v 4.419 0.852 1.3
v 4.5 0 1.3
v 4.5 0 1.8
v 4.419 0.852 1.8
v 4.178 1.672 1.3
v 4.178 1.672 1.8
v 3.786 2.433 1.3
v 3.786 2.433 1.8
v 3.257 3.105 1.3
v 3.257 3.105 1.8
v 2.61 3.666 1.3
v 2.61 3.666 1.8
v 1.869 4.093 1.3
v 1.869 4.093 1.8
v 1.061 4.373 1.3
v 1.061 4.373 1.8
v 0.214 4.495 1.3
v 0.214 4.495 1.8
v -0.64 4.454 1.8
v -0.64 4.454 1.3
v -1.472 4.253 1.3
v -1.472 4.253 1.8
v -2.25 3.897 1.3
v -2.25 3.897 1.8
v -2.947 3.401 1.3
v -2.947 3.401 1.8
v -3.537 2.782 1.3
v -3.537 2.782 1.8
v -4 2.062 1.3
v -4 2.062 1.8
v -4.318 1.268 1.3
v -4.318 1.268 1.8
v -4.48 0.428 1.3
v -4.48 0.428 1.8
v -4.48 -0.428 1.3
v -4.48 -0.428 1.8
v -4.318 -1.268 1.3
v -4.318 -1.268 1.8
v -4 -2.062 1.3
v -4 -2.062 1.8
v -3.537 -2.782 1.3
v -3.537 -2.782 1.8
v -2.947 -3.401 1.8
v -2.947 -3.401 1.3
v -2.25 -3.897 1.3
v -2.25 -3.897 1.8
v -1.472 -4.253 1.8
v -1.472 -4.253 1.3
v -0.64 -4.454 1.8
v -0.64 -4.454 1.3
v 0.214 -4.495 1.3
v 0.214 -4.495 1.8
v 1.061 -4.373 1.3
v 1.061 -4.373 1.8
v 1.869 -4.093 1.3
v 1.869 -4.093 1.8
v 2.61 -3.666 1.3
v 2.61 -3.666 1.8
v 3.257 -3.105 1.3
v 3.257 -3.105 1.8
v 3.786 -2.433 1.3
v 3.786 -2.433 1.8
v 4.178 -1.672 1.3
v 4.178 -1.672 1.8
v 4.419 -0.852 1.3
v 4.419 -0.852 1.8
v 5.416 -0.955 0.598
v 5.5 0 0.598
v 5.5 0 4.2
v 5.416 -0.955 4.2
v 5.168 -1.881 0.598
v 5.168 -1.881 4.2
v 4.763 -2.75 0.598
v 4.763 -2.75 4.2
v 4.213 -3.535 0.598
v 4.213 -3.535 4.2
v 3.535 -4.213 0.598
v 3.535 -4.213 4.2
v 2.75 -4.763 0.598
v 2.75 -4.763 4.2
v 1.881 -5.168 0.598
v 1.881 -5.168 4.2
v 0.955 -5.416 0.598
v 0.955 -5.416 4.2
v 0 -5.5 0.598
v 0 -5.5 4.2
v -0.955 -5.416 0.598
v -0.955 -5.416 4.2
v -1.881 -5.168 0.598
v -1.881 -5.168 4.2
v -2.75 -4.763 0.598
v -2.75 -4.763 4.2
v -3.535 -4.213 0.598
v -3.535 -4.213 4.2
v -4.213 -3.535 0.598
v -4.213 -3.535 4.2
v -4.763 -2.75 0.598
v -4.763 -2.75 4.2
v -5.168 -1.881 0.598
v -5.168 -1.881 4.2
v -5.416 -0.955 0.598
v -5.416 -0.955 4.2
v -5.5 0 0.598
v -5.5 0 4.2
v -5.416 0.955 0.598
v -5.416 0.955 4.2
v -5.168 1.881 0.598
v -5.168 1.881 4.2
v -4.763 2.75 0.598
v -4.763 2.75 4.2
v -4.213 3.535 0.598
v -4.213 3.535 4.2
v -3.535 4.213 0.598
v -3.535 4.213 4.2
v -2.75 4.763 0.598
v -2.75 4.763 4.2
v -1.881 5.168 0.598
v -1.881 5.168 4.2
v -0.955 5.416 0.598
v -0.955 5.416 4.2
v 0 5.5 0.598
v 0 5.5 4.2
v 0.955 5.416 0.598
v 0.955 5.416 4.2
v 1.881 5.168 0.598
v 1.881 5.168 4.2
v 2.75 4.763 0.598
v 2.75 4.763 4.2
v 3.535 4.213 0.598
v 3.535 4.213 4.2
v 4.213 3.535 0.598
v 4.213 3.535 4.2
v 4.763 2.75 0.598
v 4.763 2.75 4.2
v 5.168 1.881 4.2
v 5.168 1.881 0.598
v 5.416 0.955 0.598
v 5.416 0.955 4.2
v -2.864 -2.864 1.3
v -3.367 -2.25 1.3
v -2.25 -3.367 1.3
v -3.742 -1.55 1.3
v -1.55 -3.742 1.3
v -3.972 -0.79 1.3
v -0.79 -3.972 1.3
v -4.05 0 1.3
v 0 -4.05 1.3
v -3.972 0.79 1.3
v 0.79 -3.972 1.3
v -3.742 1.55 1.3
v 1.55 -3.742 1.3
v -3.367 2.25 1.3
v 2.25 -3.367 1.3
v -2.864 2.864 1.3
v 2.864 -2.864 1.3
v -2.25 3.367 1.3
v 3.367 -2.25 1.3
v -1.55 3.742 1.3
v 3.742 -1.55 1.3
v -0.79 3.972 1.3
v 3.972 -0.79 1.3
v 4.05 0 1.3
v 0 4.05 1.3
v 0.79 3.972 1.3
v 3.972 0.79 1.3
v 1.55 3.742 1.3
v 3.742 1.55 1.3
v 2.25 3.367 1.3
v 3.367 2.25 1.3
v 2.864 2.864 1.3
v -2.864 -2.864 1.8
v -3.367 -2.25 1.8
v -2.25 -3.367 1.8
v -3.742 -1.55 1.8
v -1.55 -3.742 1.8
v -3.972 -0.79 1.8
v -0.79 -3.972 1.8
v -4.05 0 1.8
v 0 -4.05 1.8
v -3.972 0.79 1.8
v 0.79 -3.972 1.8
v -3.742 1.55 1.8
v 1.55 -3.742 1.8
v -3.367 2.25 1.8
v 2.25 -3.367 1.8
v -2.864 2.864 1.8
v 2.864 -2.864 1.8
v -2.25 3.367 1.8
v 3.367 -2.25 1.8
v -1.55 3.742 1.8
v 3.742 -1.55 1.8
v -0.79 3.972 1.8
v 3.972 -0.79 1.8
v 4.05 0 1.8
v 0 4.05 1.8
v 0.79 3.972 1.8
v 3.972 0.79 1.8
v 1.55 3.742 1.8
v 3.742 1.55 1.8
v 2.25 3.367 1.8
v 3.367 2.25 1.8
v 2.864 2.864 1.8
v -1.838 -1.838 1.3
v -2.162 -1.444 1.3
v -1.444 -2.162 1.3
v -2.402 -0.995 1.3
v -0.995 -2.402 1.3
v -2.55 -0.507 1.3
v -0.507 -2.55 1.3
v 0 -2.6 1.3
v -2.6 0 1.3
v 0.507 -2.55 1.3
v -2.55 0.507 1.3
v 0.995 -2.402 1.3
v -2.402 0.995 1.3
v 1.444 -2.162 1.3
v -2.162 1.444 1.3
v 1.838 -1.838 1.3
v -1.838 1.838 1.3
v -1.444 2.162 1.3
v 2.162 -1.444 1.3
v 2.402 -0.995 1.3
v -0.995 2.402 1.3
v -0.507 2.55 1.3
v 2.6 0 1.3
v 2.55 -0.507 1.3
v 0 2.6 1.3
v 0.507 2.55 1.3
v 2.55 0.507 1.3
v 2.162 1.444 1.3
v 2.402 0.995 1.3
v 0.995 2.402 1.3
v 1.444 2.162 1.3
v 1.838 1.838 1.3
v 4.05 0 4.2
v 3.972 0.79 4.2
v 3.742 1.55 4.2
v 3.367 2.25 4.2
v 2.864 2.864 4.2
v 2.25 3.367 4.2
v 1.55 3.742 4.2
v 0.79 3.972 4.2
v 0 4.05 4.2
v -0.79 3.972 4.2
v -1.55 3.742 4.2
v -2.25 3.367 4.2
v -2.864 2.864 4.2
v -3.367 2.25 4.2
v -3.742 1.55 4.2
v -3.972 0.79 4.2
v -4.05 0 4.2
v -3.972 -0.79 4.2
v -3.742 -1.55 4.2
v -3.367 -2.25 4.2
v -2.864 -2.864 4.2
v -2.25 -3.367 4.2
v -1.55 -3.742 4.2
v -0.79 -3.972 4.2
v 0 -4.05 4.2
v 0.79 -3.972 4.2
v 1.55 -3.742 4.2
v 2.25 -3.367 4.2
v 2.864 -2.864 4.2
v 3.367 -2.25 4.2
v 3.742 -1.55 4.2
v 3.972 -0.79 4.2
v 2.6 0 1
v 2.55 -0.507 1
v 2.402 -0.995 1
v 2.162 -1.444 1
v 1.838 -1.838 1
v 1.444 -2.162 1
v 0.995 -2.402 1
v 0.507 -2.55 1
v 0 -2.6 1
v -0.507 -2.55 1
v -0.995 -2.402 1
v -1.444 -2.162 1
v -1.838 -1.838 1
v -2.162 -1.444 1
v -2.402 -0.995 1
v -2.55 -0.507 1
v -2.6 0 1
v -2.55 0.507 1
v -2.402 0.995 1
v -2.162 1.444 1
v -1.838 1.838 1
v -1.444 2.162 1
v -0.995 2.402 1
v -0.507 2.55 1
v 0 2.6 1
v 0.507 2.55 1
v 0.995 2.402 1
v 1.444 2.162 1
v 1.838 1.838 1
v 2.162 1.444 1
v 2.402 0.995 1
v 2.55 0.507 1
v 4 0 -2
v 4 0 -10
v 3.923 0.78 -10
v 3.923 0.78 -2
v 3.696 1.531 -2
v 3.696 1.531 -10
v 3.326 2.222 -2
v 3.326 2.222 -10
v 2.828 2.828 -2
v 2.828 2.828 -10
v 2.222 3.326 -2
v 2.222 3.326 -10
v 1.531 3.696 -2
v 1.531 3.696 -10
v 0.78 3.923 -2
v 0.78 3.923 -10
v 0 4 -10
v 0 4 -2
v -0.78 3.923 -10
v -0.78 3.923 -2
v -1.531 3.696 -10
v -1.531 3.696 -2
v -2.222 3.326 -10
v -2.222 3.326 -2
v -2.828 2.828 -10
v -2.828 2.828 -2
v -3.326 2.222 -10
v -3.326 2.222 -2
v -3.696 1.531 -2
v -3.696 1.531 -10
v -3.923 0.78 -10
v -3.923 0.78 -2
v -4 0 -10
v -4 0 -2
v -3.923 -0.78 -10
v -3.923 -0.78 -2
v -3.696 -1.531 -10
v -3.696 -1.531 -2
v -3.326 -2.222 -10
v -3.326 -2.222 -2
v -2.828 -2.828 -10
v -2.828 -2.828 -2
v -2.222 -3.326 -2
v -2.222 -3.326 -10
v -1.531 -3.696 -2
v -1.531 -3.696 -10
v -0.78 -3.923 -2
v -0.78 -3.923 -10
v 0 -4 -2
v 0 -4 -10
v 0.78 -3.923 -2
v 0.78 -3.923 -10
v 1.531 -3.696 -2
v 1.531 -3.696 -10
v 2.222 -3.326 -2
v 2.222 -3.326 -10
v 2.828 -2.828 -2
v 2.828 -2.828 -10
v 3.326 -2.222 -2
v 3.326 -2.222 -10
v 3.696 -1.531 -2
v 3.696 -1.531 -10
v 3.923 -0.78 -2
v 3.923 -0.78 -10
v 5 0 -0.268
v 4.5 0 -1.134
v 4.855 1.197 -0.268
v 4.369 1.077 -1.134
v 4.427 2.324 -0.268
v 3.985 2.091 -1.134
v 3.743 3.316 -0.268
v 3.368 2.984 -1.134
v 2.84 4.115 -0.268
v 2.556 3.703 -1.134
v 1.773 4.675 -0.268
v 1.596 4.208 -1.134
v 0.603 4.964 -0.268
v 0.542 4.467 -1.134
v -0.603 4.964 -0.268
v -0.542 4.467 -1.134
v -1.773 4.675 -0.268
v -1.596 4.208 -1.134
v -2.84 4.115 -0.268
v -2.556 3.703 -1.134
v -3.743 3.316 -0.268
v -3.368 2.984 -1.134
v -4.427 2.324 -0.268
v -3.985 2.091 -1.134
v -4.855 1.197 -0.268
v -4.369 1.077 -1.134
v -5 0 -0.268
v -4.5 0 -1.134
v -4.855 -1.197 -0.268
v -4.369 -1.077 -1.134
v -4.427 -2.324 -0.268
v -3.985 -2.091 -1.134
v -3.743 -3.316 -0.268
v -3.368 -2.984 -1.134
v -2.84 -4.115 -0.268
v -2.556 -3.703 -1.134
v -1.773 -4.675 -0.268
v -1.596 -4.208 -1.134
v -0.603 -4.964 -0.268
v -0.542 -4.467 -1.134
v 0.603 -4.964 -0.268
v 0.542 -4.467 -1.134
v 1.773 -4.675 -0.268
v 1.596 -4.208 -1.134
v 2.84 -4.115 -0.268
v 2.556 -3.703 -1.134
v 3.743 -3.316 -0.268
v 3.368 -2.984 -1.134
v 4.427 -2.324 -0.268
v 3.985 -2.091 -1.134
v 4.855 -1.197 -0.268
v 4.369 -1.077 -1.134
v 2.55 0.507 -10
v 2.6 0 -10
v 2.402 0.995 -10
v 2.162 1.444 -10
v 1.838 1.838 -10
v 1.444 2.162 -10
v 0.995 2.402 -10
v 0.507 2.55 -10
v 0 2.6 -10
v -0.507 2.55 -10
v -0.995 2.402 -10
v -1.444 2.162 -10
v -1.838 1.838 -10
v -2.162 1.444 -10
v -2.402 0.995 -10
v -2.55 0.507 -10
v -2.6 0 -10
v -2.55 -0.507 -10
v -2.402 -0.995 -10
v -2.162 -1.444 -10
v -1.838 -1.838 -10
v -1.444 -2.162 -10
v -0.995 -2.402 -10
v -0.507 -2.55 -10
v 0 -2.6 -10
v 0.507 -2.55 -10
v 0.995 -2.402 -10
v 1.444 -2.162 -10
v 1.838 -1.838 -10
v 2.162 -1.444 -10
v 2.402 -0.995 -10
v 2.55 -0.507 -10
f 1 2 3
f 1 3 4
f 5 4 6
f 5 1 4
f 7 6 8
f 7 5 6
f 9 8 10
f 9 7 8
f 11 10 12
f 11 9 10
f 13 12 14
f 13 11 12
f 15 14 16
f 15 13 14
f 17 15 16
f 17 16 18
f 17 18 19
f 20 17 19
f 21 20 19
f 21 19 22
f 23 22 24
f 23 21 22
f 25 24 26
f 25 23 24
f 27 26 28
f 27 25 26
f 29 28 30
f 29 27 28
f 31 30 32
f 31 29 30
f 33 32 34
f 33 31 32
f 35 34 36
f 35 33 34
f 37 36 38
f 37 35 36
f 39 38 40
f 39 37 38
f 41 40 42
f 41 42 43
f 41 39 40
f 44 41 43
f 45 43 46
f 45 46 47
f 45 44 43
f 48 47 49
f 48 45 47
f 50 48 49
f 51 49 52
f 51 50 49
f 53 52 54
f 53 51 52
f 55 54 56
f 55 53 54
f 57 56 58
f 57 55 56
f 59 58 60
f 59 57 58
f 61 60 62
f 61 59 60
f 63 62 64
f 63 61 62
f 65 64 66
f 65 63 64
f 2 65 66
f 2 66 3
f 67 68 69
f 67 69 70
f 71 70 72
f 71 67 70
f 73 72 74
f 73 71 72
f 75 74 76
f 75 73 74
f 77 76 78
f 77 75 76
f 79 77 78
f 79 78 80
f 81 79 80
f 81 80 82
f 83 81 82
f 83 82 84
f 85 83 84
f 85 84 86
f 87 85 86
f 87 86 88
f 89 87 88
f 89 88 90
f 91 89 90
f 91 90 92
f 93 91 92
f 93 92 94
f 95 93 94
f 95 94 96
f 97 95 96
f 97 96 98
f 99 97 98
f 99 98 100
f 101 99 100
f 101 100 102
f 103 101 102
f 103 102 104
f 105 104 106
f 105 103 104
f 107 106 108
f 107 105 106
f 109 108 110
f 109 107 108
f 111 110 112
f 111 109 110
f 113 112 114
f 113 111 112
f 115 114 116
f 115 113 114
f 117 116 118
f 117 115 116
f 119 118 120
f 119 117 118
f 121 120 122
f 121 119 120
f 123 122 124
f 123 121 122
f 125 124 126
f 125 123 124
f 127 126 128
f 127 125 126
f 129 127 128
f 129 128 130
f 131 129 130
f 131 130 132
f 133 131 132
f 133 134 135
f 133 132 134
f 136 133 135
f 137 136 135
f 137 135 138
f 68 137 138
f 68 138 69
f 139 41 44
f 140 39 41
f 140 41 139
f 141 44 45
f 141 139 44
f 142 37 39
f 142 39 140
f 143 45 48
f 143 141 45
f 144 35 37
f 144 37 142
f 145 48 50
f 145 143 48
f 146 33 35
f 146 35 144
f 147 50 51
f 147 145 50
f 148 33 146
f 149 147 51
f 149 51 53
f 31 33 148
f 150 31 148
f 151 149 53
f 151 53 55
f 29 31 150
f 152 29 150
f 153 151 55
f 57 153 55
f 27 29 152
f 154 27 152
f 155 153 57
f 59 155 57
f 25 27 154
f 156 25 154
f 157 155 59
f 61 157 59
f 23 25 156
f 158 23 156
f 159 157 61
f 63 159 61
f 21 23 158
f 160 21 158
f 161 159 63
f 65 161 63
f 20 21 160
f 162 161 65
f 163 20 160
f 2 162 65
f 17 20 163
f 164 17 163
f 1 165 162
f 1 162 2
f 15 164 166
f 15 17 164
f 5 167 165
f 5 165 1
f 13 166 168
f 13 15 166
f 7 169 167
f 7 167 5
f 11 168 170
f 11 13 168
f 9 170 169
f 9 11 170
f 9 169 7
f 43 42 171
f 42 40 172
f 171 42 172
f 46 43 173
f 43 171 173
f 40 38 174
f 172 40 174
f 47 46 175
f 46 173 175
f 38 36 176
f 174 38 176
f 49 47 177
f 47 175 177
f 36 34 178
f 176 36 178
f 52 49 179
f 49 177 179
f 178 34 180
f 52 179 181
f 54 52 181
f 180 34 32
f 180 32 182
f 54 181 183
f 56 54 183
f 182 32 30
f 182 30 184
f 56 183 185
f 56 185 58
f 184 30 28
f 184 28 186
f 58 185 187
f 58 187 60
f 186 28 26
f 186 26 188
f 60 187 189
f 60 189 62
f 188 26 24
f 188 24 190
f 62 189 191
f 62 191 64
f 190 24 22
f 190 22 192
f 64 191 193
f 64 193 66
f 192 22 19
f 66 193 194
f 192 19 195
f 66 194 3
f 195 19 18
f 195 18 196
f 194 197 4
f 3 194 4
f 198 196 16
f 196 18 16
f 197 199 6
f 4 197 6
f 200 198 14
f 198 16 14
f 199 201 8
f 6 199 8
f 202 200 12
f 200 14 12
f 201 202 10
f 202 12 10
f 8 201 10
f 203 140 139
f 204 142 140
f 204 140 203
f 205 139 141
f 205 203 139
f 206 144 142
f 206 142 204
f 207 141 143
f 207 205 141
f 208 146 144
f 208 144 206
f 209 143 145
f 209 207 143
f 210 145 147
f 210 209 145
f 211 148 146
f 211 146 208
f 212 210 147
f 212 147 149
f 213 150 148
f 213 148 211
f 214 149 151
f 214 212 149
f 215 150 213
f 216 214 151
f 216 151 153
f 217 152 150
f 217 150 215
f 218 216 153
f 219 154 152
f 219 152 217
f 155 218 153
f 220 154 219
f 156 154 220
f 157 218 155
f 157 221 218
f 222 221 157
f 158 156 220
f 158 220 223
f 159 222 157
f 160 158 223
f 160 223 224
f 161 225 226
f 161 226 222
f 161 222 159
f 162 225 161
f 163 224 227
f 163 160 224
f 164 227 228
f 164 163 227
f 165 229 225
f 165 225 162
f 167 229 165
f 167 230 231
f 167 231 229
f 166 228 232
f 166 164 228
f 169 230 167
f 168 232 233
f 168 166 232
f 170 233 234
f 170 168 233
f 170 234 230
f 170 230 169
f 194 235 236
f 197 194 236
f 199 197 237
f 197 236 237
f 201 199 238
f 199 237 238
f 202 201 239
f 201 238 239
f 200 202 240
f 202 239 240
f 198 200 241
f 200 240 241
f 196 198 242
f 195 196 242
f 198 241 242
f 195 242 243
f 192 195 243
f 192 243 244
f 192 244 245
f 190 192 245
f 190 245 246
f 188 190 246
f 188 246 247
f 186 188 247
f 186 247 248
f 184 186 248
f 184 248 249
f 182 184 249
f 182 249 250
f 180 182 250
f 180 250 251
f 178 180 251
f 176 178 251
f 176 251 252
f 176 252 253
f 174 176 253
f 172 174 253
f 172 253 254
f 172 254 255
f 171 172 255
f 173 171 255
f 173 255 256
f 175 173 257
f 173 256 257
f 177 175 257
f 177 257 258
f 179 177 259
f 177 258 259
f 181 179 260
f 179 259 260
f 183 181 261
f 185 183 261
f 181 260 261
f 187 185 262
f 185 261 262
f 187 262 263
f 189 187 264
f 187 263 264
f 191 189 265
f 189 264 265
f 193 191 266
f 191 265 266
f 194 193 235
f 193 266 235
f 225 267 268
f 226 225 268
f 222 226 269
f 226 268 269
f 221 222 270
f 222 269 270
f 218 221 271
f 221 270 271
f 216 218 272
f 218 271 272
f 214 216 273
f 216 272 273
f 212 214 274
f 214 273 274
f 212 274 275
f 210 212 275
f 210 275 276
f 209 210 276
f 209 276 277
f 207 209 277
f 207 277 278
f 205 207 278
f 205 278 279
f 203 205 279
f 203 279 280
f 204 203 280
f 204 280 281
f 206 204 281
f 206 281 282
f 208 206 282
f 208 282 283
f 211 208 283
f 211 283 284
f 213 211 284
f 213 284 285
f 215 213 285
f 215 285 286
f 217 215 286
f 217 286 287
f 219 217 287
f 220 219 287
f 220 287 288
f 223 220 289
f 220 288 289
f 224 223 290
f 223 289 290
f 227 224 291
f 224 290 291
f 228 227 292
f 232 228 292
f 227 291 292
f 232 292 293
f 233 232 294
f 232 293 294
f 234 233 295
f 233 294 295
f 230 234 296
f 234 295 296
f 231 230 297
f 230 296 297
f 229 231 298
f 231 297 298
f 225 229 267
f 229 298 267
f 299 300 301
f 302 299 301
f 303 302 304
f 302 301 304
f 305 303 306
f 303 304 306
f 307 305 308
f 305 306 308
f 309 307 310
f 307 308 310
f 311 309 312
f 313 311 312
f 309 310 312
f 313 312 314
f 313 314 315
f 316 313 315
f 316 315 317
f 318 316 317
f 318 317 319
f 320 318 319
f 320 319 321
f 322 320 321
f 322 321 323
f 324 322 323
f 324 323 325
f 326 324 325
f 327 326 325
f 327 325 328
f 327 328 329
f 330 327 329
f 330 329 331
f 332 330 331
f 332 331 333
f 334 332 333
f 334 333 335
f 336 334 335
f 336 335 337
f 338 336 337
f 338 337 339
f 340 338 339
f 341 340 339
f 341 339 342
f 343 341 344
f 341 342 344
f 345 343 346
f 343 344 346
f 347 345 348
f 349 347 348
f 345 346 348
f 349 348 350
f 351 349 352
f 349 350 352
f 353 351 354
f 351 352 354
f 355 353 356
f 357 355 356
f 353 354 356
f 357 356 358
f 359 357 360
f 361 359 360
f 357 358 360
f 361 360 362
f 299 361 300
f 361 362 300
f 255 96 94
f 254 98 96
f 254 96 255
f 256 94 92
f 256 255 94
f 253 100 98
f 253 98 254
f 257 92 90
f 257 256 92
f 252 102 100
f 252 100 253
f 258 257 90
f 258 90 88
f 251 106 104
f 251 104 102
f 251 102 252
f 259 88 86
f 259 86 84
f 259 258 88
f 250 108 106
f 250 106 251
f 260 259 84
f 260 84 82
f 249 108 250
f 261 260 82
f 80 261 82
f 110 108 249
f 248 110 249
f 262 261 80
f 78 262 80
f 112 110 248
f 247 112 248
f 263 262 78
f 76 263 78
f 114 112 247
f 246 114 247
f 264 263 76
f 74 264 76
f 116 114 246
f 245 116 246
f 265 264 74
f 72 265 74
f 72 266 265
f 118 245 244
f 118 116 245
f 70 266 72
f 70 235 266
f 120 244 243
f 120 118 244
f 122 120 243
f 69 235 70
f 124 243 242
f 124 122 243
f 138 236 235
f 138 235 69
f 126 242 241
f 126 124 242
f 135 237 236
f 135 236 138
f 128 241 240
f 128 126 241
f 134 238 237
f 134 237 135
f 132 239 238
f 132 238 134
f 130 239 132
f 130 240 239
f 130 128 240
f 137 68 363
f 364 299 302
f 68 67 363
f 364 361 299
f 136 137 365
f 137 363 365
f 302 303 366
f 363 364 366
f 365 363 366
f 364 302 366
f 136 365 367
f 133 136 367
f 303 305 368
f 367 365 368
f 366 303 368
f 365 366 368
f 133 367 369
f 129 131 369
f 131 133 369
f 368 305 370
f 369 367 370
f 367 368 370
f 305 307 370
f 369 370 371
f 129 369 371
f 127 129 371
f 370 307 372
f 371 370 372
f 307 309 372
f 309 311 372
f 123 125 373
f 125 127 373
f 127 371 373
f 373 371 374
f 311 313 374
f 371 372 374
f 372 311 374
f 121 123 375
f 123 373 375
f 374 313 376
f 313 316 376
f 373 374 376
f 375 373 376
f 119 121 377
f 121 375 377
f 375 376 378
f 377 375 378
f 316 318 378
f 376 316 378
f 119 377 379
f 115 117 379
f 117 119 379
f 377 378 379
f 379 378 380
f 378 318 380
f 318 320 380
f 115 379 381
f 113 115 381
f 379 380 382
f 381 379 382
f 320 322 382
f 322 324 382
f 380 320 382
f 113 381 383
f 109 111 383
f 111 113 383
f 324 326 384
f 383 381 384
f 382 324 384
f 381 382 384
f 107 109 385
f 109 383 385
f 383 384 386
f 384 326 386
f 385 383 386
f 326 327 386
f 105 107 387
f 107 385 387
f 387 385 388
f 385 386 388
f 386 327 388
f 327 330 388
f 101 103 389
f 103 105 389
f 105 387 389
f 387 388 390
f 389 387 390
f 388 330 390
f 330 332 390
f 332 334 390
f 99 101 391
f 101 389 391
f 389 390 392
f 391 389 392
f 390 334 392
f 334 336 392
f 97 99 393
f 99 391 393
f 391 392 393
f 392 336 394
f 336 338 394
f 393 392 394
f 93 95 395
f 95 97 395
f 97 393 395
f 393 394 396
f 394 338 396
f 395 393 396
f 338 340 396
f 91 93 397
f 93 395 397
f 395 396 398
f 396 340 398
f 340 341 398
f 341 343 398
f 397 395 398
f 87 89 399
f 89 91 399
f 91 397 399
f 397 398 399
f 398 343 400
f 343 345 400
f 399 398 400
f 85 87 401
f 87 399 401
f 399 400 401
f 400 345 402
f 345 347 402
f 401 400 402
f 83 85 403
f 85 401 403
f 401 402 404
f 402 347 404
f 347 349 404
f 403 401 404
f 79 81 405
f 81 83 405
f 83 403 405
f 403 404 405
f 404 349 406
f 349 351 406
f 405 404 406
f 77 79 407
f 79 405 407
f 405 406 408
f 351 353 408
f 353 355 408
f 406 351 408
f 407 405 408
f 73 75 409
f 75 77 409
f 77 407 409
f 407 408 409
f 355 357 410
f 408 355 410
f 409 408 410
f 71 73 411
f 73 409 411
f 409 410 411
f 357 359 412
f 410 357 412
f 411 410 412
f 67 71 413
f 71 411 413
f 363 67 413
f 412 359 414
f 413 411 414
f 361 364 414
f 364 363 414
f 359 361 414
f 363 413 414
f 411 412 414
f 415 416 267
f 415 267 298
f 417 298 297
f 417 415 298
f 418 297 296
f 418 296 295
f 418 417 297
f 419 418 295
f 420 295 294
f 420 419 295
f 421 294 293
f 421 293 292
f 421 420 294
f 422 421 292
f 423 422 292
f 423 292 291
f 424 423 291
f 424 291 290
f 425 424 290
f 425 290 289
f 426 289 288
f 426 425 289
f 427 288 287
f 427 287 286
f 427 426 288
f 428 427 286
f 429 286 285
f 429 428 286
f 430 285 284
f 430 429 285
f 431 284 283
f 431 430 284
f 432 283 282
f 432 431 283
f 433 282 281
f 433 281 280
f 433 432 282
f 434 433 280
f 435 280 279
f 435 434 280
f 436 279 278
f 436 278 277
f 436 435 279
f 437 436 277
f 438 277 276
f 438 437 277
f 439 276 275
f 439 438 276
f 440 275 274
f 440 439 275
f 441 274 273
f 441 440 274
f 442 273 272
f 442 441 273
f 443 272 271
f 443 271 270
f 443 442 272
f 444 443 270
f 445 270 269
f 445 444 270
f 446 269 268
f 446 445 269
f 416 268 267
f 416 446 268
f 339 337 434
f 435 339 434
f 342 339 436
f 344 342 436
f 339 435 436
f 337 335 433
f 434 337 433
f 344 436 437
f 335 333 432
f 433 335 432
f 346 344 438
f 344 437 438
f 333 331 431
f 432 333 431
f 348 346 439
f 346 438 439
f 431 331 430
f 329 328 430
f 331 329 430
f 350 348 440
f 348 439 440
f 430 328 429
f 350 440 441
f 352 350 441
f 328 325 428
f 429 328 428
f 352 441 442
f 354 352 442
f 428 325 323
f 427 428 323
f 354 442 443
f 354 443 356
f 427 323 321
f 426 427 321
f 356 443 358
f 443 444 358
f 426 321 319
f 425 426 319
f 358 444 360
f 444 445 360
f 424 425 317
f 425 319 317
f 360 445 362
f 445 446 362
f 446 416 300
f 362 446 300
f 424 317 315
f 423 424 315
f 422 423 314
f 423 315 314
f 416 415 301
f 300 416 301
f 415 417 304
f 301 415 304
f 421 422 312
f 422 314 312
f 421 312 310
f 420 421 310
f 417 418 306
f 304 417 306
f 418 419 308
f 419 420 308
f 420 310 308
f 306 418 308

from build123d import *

# Parameters (mm, degrees)
BOSS_EXTRUDE1_DEPTH      = 1
BOSS_EXTRUDE1_DEPTH_BACK = 10
SKETCH1_R                = 4
SKETCH1_R_2              = 2.6
SKETCH2_R                = 5.5
BOSS_EXTRUDE2_DEPTH      = 3.2
SKETCH3_R                = 4.05
CUT_EXTRUDE1_DEPTH       = 2.9
SKETCH4_R                = 2.6
CUT_EXTRUDE2_DEPTH       = 17.190738093
SKETCH5_R                = 4.5
CUT_EXTRUDE3_DEPTH       = 0.5
CHAMFER1_SIZE            = 1.732050808
CHAMFER1_SIZE_2          = 3


with BuildPart() as part:
    # Sketch1 → Boss-Extrude1 (new, two sides: drawn at the far end of the back side and taken through both)
    with BuildSketch(Plane.XY.offset(-BOSS_EXTRUDE1_DEPTH_BACK)):
        Circle(SKETCH1_R)
        Circle(SKETCH1_R_2, mode=Mode.SUBTRACT)
    extrude(amount=BOSS_EXTRUDE1_DEPTH + BOSS_EXTRUDE1_DEPTH_BACK)

    # Sketch2 → Boss-Extrude2 (add)
    with BuildSketch(Plane.XY.offset(1)):
        Circle(SKETCH2_R)
    extrude(amount=BOSS_EXTRUDE2_DEPTH)

    # Sketch3 → Cut-Extrude1 (cut)
    with BuildSketch(Plane.XY.offset(4.2)):
        Circle(SKETCH3_R)
    extrude(amount=-CUT_EXTRUDE1_DEPTH, mode=Mode.SUBTRACT)

    # Sketch4 → Cut-Extrude2 (cut, through all)
    with BuildSketch(Plane(origin=(0, 0, -10), x_dir=(-1, 0, 0), z_dir=(0, 0, -1))):
        with Locations(Location((0, 0, 0), (0, 0, 180))):
            Circle(SKETCH4_R)
    extrude(amount=-CUT_EXTRUDE2_DEPTH, mode=Mode.SUBTRACT)

    # Sketch5 → Cut-Extrude3 (cut)
    with BuildSketch(Plane.XY.offset(1.3)):
        Circle(SKETCH5_R)
    extrude(amount=CUT_EXTRUDE3_DEPTH, mode=Mode.SUBTRACT)

    # Chamfer1
    # the kernel refuses this chamfer: 3, 1.732050808 mm, written as the material it adds along each edge
    with BuildSketch(Plane(origin=(0, 0, 1), x_dir=(1, 0, 0), z_dir=(0, -1, 0))) as chamfer1_piece_1_section:
        Polygon((4 + CHAMFER1_SIZE, 0), (4, -CHAMFER1_SIZE_2), (4, 0), align=None)
    chamfer1_piece_1 = revolve(axis=Axis((0, 0, 1), (0, 0, 1)), mode=Mode.PRIVATE)
    chamfer1_piece_1 = chamfer1_piece_1 & Plane(origin=(0, 0, -0.731250221), x_dir=(1, 0, 0), z_dir=(0, 0, -1)) * Cylinder(5.5, 23, mode=Mode.PRIVATE)
    add(chamfer1_piece_1)


solid = part.part
